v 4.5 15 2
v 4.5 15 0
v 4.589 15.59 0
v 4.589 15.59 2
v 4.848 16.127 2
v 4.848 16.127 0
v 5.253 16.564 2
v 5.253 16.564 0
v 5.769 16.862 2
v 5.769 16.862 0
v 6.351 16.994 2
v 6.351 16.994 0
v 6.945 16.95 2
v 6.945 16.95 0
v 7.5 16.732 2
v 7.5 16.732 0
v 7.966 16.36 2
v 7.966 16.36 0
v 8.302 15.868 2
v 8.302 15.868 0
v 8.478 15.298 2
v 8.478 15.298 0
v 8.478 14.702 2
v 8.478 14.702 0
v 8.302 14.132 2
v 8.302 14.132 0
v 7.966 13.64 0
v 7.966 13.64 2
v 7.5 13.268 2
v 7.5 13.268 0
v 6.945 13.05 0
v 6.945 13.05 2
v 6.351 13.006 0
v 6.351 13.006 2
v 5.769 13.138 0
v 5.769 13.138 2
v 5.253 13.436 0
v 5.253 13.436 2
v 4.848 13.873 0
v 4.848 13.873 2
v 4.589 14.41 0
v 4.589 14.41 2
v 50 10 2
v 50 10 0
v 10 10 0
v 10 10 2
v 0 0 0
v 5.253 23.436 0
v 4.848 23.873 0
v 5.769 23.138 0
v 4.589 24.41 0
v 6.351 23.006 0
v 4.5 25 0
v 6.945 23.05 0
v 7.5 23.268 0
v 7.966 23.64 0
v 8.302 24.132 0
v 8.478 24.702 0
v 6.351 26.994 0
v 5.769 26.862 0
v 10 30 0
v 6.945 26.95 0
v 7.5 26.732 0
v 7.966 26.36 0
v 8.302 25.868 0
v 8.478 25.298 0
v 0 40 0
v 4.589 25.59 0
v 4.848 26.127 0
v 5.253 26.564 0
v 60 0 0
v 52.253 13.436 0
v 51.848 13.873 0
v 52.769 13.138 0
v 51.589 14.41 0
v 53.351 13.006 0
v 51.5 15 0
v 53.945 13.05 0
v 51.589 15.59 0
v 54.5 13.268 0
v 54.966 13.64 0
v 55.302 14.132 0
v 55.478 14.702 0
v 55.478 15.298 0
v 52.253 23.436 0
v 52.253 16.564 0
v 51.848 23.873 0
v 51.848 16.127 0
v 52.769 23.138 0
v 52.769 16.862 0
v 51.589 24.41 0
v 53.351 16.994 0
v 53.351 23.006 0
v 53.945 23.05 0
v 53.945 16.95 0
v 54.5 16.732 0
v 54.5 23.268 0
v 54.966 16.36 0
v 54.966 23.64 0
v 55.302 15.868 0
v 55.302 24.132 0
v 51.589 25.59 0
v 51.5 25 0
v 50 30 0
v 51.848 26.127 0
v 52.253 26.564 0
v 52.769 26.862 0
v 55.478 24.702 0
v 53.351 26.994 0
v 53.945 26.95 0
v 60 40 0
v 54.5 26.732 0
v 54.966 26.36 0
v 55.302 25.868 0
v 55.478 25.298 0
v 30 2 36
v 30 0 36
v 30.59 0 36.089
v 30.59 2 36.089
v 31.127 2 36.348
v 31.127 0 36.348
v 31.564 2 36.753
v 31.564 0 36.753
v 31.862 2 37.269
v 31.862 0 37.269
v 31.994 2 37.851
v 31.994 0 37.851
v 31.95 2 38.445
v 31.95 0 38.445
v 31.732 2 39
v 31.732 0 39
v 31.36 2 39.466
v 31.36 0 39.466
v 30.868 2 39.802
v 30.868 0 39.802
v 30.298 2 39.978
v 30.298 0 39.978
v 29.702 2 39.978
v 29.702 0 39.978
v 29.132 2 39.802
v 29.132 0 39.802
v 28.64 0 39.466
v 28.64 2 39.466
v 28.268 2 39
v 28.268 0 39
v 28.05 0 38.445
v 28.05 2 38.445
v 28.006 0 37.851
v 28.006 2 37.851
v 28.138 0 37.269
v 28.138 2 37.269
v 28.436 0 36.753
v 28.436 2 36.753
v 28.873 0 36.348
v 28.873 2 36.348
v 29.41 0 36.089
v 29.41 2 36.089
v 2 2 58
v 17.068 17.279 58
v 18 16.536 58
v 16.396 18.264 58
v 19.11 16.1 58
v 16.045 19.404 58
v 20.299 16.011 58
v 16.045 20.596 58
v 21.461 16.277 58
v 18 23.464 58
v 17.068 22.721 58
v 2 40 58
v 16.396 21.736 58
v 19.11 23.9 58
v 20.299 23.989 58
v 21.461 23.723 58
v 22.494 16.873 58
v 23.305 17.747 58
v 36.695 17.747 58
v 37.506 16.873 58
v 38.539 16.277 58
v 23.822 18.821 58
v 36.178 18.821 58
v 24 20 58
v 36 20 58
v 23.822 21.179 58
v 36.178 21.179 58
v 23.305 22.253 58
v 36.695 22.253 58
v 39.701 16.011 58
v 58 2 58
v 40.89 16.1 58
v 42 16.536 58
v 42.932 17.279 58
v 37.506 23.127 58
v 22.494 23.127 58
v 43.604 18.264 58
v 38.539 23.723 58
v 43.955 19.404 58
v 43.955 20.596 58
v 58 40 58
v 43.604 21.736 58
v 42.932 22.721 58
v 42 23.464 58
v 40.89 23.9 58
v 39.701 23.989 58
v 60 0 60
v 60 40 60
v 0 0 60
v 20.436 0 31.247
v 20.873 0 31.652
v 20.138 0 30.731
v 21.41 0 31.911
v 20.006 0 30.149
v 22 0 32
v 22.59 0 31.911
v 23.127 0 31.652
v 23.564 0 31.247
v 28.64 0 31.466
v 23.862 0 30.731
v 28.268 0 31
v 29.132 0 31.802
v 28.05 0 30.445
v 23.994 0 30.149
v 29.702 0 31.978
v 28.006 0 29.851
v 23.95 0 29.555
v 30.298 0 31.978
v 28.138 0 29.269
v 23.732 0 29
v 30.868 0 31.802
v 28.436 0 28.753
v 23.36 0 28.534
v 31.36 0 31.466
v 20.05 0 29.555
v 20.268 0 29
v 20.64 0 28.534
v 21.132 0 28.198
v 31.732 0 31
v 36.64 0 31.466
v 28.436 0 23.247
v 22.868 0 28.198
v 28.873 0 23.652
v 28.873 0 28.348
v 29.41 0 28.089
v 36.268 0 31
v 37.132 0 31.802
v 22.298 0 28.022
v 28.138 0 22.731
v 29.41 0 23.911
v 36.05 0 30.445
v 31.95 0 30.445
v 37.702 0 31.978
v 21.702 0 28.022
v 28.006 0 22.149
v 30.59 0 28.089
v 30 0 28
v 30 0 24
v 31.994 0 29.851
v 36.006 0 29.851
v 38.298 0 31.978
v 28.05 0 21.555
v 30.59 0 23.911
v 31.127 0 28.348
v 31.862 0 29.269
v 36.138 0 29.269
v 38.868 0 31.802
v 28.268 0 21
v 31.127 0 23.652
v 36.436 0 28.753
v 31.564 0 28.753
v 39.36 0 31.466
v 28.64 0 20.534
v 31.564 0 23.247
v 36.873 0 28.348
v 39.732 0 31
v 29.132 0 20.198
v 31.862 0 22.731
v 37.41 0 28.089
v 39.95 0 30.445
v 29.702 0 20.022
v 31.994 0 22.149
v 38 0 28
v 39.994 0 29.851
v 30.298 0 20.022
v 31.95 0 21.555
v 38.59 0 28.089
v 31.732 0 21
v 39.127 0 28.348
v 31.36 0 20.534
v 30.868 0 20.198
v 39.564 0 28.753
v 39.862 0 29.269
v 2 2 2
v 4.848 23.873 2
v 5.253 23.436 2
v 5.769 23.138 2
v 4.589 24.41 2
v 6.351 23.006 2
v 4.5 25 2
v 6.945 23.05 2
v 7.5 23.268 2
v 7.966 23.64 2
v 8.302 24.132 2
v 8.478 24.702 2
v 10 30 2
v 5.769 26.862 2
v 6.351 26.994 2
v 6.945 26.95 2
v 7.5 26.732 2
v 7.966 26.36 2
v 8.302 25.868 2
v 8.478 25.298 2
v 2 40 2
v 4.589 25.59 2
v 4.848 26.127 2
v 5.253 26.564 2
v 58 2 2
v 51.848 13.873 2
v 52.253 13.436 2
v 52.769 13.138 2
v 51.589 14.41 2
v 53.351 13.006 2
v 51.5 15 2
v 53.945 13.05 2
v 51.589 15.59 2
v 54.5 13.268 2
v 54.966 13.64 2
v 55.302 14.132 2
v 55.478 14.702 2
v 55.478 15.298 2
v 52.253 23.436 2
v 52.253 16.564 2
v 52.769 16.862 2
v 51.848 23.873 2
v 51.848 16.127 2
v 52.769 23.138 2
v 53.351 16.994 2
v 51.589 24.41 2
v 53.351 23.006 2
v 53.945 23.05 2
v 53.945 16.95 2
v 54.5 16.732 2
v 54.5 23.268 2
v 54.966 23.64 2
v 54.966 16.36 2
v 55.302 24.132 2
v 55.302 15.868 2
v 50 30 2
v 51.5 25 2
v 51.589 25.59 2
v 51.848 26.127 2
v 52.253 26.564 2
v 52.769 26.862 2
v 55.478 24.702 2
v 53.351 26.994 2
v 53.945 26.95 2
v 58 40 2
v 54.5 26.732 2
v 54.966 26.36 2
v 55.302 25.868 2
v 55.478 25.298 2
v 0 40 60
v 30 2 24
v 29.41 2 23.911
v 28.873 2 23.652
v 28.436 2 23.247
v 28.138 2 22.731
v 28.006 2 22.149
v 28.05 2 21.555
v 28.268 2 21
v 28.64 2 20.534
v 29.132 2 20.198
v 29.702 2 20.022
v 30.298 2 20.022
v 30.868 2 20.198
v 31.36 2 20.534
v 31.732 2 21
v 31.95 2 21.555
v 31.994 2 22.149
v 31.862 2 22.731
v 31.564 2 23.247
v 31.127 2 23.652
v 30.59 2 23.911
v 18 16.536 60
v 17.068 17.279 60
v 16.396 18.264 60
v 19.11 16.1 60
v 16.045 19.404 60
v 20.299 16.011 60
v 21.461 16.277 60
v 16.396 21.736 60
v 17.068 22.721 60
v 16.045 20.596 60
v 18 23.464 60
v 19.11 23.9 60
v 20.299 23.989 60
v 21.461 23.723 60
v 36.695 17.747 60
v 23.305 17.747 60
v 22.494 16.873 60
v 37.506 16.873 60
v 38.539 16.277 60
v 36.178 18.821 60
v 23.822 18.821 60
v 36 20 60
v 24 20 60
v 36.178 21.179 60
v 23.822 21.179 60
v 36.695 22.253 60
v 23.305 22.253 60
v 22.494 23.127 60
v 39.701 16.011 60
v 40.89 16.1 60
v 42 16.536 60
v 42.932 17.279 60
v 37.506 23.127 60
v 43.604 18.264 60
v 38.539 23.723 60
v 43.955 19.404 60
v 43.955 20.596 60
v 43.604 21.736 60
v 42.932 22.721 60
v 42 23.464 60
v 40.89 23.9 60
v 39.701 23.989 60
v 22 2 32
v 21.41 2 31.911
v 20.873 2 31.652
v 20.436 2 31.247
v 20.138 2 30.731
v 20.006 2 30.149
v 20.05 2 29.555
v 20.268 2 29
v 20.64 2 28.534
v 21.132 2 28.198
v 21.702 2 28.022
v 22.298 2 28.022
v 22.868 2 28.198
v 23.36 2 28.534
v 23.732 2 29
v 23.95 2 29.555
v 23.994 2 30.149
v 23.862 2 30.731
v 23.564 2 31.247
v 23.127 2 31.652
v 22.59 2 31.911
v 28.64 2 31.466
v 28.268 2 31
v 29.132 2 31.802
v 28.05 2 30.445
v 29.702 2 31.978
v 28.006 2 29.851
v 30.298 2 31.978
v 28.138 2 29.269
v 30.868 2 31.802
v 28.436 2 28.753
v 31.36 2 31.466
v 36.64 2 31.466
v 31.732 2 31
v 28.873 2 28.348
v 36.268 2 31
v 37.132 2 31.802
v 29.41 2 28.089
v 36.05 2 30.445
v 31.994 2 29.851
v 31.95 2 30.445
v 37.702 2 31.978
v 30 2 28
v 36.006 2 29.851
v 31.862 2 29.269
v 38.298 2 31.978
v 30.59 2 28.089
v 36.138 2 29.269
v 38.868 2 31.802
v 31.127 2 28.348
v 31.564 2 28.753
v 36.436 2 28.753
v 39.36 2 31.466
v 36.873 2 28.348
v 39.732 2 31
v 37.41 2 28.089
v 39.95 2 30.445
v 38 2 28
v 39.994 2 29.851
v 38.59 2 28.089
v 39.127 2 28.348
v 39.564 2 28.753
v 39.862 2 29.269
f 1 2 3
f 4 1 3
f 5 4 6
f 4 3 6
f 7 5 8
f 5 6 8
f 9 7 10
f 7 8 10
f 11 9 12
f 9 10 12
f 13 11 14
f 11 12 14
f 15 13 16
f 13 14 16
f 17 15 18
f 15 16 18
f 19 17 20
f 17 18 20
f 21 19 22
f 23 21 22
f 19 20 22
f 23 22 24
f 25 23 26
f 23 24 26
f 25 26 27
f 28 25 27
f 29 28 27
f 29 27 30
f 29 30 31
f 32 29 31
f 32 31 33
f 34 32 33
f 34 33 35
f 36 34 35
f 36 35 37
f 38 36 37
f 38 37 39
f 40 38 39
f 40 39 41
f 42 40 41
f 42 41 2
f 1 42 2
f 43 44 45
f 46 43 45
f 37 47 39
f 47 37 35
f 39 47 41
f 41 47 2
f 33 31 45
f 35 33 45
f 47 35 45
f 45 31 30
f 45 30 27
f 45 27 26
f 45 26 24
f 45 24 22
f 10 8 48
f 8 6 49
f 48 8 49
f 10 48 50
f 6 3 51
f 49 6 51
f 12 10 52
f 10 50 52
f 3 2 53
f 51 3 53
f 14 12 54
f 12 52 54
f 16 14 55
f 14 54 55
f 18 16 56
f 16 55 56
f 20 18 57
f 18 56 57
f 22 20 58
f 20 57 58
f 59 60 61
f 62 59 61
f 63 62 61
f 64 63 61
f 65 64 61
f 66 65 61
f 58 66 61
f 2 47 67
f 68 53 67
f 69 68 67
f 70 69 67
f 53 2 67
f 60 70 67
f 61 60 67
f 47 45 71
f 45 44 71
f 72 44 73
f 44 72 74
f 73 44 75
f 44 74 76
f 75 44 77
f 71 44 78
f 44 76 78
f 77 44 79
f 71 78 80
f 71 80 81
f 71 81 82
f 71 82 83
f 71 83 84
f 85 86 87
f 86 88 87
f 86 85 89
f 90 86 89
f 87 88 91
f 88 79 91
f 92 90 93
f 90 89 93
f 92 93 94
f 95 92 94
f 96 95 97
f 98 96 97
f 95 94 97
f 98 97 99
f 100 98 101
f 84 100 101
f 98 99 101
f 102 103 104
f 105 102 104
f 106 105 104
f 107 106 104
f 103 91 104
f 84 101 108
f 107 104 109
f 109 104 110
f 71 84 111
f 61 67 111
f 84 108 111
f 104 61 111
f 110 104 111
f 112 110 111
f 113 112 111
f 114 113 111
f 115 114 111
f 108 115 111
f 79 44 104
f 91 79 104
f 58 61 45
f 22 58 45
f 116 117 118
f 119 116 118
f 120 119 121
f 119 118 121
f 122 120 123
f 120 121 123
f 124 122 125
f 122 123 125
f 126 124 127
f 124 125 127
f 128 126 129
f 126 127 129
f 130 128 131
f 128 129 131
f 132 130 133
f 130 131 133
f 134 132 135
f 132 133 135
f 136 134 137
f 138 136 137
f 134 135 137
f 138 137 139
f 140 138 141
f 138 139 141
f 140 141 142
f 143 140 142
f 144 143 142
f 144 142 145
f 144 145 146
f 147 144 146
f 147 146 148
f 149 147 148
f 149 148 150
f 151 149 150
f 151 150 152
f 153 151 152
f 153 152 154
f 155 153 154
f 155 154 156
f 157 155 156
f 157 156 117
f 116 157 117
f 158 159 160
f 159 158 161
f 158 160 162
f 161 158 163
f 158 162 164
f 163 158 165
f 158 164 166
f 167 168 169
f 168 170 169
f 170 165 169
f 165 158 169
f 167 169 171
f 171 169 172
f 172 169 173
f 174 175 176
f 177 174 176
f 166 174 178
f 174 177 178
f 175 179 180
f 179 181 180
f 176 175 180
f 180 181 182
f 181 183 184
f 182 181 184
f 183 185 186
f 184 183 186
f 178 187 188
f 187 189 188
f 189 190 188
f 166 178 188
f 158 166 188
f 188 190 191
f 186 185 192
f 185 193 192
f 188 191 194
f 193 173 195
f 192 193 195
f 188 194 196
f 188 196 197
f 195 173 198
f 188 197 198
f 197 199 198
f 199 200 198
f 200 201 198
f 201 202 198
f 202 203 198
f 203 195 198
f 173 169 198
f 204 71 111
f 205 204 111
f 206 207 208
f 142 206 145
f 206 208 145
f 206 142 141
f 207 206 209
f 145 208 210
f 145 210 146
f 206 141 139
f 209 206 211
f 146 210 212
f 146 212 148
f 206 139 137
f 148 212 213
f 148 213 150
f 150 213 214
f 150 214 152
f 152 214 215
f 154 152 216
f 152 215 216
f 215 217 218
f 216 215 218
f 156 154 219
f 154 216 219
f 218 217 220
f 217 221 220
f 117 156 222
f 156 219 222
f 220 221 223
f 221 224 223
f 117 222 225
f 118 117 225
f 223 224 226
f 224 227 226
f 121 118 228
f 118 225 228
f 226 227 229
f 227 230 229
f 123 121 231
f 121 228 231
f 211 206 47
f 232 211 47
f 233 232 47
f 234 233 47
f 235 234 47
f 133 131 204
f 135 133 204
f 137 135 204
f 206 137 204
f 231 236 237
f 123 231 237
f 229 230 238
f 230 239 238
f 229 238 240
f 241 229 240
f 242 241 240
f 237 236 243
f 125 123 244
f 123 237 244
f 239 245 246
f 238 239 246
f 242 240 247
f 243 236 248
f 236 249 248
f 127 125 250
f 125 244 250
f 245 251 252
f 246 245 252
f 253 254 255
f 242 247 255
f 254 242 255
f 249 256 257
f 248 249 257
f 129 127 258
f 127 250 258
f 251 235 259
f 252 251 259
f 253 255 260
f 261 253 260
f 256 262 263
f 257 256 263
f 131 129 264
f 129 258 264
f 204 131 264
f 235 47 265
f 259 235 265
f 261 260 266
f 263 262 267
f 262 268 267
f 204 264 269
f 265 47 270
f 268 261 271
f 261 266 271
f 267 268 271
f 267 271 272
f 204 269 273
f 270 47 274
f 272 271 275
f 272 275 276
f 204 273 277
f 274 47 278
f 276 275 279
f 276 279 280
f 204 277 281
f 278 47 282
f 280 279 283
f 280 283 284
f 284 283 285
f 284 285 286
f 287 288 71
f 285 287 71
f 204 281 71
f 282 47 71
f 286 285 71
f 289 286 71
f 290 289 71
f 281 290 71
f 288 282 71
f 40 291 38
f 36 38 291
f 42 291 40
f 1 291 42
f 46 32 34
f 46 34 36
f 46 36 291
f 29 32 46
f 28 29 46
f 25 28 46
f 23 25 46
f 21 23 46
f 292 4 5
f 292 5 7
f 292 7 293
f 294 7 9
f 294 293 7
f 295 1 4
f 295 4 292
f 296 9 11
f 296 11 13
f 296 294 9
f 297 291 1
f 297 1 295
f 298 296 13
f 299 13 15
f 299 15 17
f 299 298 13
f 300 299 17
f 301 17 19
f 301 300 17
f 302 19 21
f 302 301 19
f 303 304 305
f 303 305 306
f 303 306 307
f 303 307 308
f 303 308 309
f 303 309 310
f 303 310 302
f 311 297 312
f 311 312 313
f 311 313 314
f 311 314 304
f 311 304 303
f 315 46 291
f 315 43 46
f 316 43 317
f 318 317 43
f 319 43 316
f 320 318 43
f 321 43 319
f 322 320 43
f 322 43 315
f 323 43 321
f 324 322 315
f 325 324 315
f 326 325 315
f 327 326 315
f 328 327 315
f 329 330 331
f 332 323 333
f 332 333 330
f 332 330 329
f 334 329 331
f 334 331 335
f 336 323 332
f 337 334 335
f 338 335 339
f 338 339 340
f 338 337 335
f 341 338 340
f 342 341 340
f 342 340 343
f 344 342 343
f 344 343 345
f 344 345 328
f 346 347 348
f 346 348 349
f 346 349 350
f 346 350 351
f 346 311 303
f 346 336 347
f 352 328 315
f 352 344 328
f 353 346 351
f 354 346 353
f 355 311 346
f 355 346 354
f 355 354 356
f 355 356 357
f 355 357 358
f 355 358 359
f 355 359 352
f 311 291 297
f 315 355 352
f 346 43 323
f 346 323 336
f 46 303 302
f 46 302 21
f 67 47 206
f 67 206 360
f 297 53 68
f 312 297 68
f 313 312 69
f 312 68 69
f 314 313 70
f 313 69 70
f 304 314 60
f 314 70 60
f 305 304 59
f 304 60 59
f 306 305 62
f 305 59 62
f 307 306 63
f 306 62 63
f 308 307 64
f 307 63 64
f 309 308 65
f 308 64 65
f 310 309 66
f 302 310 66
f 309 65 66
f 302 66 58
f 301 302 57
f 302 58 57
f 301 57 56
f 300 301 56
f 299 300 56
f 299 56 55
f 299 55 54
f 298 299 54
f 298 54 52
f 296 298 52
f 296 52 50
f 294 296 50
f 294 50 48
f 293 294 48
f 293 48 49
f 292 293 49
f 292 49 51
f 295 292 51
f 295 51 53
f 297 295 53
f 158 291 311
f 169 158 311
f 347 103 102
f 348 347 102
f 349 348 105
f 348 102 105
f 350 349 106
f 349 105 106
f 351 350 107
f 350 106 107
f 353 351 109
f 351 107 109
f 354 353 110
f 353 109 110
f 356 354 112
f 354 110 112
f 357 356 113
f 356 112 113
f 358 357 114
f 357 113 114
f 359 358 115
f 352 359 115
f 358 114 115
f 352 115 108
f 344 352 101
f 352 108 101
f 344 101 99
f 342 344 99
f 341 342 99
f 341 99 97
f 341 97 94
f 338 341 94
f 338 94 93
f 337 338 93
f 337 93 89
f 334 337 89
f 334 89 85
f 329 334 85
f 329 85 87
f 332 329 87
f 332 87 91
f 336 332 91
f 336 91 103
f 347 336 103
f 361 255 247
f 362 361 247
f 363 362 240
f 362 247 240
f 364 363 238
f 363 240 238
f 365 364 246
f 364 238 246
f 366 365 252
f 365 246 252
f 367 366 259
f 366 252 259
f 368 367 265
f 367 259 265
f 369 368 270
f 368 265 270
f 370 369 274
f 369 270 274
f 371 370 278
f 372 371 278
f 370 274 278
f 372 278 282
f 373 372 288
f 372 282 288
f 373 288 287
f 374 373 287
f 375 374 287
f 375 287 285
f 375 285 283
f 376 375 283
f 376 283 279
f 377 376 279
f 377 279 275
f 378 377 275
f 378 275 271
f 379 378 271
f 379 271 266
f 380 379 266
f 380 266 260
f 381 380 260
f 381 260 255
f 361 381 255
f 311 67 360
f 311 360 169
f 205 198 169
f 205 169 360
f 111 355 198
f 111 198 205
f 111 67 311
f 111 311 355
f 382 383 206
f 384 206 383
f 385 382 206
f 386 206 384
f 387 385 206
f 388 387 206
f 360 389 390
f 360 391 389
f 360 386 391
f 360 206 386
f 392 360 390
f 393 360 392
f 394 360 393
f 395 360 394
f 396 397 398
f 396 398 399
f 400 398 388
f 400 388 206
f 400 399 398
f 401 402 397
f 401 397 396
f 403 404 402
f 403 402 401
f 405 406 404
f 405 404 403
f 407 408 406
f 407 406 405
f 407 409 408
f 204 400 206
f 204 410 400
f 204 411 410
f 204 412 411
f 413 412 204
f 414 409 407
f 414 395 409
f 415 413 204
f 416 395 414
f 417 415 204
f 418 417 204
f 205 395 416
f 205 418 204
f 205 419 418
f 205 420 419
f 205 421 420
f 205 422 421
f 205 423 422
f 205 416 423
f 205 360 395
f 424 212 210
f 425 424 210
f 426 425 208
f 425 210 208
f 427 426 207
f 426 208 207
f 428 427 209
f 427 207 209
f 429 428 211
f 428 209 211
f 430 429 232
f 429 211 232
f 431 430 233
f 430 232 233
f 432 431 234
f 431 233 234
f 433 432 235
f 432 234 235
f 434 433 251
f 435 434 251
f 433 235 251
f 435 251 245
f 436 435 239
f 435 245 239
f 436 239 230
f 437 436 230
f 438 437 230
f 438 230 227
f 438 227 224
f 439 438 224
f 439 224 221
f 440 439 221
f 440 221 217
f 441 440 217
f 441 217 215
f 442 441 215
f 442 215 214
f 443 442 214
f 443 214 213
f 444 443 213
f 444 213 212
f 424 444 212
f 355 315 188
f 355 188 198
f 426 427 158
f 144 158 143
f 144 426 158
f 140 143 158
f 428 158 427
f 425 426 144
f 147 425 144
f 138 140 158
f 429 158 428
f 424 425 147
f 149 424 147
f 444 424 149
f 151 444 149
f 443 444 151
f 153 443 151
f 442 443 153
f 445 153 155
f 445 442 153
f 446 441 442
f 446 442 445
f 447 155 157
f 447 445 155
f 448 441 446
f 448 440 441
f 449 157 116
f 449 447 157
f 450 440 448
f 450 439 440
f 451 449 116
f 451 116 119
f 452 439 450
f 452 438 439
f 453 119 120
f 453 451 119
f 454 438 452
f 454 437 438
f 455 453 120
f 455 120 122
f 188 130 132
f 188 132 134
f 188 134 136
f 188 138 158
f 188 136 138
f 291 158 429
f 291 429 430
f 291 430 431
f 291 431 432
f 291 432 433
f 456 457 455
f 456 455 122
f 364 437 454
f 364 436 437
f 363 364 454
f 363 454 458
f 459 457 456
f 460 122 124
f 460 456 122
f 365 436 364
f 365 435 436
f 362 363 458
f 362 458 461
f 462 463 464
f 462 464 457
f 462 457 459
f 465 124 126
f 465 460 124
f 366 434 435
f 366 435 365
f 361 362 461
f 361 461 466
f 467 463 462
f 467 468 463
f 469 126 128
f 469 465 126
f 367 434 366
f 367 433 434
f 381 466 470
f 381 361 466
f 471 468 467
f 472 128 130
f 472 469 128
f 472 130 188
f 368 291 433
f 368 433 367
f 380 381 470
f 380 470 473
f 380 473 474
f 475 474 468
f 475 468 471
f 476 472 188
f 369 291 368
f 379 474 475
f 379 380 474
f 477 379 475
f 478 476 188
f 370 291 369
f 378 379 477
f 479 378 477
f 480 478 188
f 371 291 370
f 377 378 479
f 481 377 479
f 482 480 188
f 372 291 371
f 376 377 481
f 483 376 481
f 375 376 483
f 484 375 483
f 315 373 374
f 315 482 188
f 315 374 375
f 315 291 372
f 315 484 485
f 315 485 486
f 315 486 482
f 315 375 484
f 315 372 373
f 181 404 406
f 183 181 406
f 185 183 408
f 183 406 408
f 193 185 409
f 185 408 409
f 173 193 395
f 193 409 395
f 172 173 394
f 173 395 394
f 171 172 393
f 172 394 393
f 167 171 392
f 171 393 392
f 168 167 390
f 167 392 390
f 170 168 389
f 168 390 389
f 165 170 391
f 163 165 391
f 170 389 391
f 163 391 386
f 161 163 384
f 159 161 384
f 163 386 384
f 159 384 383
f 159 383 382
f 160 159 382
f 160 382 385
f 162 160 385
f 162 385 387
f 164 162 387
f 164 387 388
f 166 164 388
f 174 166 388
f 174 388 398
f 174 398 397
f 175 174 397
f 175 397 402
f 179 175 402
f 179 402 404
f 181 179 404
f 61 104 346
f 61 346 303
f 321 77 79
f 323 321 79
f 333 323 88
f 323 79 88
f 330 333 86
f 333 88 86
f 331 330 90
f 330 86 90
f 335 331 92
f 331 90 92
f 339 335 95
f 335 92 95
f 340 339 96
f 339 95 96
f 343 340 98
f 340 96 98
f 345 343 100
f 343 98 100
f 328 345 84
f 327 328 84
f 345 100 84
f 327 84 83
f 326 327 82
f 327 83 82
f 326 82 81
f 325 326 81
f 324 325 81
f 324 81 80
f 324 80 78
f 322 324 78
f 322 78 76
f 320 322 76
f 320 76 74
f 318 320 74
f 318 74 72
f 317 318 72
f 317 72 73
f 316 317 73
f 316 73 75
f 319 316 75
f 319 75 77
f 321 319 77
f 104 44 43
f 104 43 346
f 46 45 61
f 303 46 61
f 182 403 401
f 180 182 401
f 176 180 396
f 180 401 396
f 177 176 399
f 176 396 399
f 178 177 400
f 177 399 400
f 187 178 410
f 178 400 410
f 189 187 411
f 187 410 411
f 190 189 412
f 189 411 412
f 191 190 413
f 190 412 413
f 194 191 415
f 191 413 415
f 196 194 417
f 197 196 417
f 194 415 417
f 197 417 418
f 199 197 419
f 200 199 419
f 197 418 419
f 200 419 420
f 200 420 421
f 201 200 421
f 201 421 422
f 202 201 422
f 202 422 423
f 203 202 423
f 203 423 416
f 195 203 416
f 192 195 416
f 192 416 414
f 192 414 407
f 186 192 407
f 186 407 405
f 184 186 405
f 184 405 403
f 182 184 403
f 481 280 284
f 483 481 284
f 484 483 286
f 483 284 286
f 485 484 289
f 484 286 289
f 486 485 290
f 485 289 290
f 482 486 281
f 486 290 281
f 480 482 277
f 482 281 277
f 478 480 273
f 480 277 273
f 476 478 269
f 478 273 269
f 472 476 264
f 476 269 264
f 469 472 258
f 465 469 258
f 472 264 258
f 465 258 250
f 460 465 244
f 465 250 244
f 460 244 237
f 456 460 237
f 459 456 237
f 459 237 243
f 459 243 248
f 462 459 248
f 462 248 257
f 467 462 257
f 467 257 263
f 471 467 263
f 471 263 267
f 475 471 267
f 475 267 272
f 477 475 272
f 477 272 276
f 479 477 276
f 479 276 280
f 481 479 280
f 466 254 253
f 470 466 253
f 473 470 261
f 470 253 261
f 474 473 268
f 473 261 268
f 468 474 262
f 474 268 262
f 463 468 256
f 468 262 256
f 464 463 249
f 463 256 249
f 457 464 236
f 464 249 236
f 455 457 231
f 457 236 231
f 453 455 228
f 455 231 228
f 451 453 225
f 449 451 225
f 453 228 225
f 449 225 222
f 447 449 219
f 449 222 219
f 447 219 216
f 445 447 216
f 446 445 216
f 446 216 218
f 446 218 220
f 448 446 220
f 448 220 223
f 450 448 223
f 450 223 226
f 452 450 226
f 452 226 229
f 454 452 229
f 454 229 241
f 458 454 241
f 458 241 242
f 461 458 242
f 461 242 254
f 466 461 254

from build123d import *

# Parameters (mm, degrees)
IZIM2_W                     = 60
IZIM2_H                     = 40
Y_KSEKLIK_EKSTR_ZYON1_DEPTH = 60
BO_ALTMA1_T                 = -2
KES_EKSTR_ZYON2_REACH       = 95.808
IZIM4_R                     = 2
IZIM4_W                     = 40
IZIM4_H                     = 20
KES_EKSTR_ZYON3_REACH       = 95.808
IZIM5_R                     = 2
KES_EKSTR_ZYON4_REACH       = 95.808
IZIM6_R                     = 4


with BuildPart() as part:
    # Çizim2 → Yükseklik-Ekstrüzyon1 (new body)
    with BuildSketch(Plane.XY):
        with Locations((30, 20)):
            Rectangle(IZIM2_W, IZIM2_H)
    extrude(amount=Y_KSEKLIK_EKSTR_ZYON1_DEPTH)

    # İç Boşaltma1
    bo_altma1_openings = [part.faces().sort_by_distance(p)[0] for p in [
        (30, 40, 30),
    ]]
    offset(amount=BO_ALTMA1_T, openings=bo_altma1_openings, kind=Kind.INTERSECTION)

    # Çizim4 → Kes-Ekstrüzyon2 (cut, up to next)
    with BuildSketch(Plane(origin=(0, 0, 0), x_dir=(-1, 0, 0), z_dir=(0, 0, -1)), mode=Mode.PRIVATE) as kes_ekstr_zyon2_sk1:
        with Locations((-53.5, 25)):
            Circle(IZIM4_R)
    kes_ekstr_zyon2_tool1 = extrude(kes_ekstr_zyon2_sk1.sketch, amount=-KES_EKSTR_ZYON2_REACH, mode=Mode.PRIVATE) & part.part
    # Çizim4 → Kes-Ekstrüzyon2 (cut, up to next)
    with BuildSketch(Plane(origin=(0, 0, 0), x_dir=(-1, 0, 0), z_dir=(0, 0, -1)), mode=Mode.PRIVATE) as kes_ekstr_zyon2_sk2:
        with Locations((-53.5, 15)):
            Circle(IZIM4_R)
    kes_ekstr_zyon2_tool2 = extrude(kes_ekstr_zyon2_sk2.sketch, amount=-KES_EKSTR_ZYON2_REACH, mode=Mode.PRIVATE) & part.part
    # Çizim4 → Kes-Ekstrüzyon2 (cut, up to next)
    with BuildSketch(Plane(origin=(0, 0, 0), x_dir=(-1, 0, 0), z_dir=(0, 0, -1)), mode=Mode.PRIVATE) as kes_ekstr_zyon2_sk3:
        with Locations((-6.5, 15)):
            Circle(IZIM4_R)
    kes_ekstr_zyon2_tool3 = extrude(kes_ekstr_zyon2_sk3.sketch, amount=-KES_EKSTR_ZYON2_REACH, mode=Mode.PRIVATE) & part.part
    # Çizim4 → Kes-Ekstrüzyon2 (cut, up to next)
    with BuildSketch(Plane(origin=(0, 0, 0), x_dir=(-1, 0, 0), z_dir=(0, 0, -1)), mode=Mode.PRIVATE) as kes_ekstr_zyon2_sk4:
        with Locations((-6.5, 25)):
            Circle(IZIM4_R)
    kes_ekstr_zyon2_tool4 = extrude(kes_ekstr_zyon2_sk4.sketch, amount=-KES_EKSTR_ZYON2_REACH, mode=Mode.PRIVATE) & part.part
    # Çizim4 → Kes-Ekstrüzyon2 (cut, up to next)
    with BuildSketch(Plane(origin=(0, 0, 0), x_dir=(-1, 0, 0), z_dir=(0, 0, -1)), mode=Mode.PRIVATE) as kes_ekstr_zyon2_sk5:
        with Locations((-30, 20)):
            Rectangle(IZIM4_W, IZIM4_H)
    kes_ekstr_zyon2_tool5 = extrude(kes_ekstr_zyon2_sk5.sketch, amount=-KES_EKSTR_ZYON2_REACH, mode=Mode.PRIVATE) & part.part
    add(kes_ekstr_zyon2_tool1.solids().sort_by_distance((53.5, 25, 0))[0], mode=Mode.SUBTRACT)
    add(kes_ekstr_zyon2_tool2.solids().sort_by_distance((53.5, 15, 0))[0], mode=Mode.SUBTRACT)
    add(kes_ekstr_zyon2_tool3.solids().sort_by_distance((6.5, 15, 0))[0], mode=Mode.SUBTRACT)
    add(kes_ekstr_zyon2_tool4.solids().sort_by_distance((6.5, 25, 0))[0], mode=Mode.SUBTRACT)
    add(kes_ekstr_zyon2_tool5.solids().sort_by_distance((30, 20, 0))[0], mode=Mode.SUBTRACT)

    # Çizim5 → Kes-Ekstrüzyon3 (cut, up to next)
    with BuildSketch(Plane.XZ, mode=Mode.PRIVATE) as kes_ekstr_zyon3_sk1:
        with Locations(Location((30, 30, 0), (0, 0, 270))):
            Circle(IZIM5_R)
    kes_ekstr_zyon3_tool1 = extrude(kes_ekstr_zyon3_sk1.sketch, amount=-KES_EKSTR_ZYON3_REACH, mode=Mode.PRIVATE) & part.part
    # Çizim5 → Kes-Ekstrüzyon3 (cut, up to next)
    with BuildSketch(Plane.XZ, mode=Mode.PRIVATE) as kes_ekstr_zyon3_sk2:
        with Locations(Location((38, 30, 0), (0, 0, 270))):
            Circle(IZIM5_R)
    kes_ekstr_zyon3_tool2 = extrude(kes_ekstr_zyon3_sk2.sketch, amount=-KES_EKSTR_ZYON3_REACH, mode=Mode.PRIVATE) & part.part
    # Çizim5 → Kes-Ekstrüzyon3 (cut, up to next)
    with BuildSketch(Plane.XZ, mode=Mode.PRIVATE) as kes_ekstr_zyon3_sk3:
        with Locations(Location((30, 38, 0), (0, 0, 270))):
            Circle(IZIM5_R)
    kes_ekstr_zyon3_tool3 = extrude(kes_ekstr_zyon3_sk3.sketch, amount=-KES_EKSTR_ZYON3_REACH, mode=Mode.PRIVATE) & part.part
    # Çizim5 → Kes-Ekstrüzyon3 (cut, up to next)
    with BuildSketch(Plane.XZ, mode=Mode.PRIVATE) as kes_ekstr_zyon3_sk4:
        with Locations(Location((30, 22, 0), (0, 0, 90))):
            Circle(IZIM5_R)
    kes_ekstr_zyon3_tool4 = extrude(kes_ekstr_zyon3_sk4.sketch, amount=-KES_EKSTR_ZYON3_REACH, mode=Mode.PRIVATE) & part.part
    # Çizim5 → Kes-Ekstrüzyon3 (cut, up to next)
    with BuildSketch(Plane.XZ, mode=Mode.PRIVATE) as kes_ekstr_zyon3_sk5:
        with Locations(Location((22, 30, 0), (0, 0, 90))):
            Circle(IZIM5_R)
    kes_ekstr_zyon3_tool5 = extrude(kes_ekstr_zyon3_sk5.sketch, amount=-KES_EKSTR_ZYON3_REACH, mode=Mode.PRIVATE) & part.part
    add(kes_ekstr_zyon3_tool1.solids().sort_by_distance((30, 0, 30))[0], mode=Mode.SUBTRACT)
    add(kes_ekstr_zyon3_tool2.solids().sort_by_distance((38, 0, 30))[0], mode=Mode.SUBTRACT)
    add(kes_ekstr_zyon3_tool3.solids().sort_by_distance((30, 0, 38))[0], mode=Mode.SUBTRACT)
    add(kes_ekstr_zyon3_tool4.solids().sort_by_distance((30, 0, 22))[0], mode=Mode.SUBTRACT)
    add(kes_ekstr_zyon3_tool5.solids().sort_by_distance((22, 0, 30))[0], mode=Mode.SUBTRACT)

    # Çizim6 → Kes-Ekstrüzyon4 (cut, up to next)
    with BuildSketch(Plane.XY.offset(60), mode=Mode.PRIVATE) as kes_ekstr_zyon4_sk1:
        with Locations((20, 20)):
            Circle(IZIM6_R)
    kes_ekstr_zyon4_tool1 = extrude(kes_ekstr_zyon4_sk1.sketch, amount=-KES_EKSTR_ZYON4_REACH, mode=Mode.PRIVATE) & part.part
    # Çizim6 → Kes-Ekstrüzyon4 (cut, up to next)
    with BuildSketch(Plane.XY.offset(60), mode=Mode.PRIVATE) as kes_ekstr_zyon4_sk2:
        with Locations(Location((40, 20, 0), (0, 0, 180))):
            Circle(IZIM6_R)
    kes_ekstr_zyon4_tool2 = extrude(kes_ekstr_zyon4_sk2.sketch, amount=-KES_EKSTR_ZYON4_REACH, mode=Mode.PRIVATE) & part.part
    add(kes_ekstr_zyon4_tool1.solids().sort_by_distance((20, 20, 60))[0], mode=Mode.SUBTRACT)
    add(kes_ekstr_zyon4_tool2.solids().sort_by_distance((40, 20, 60))[0], mode=Mode.SUBTRACT)


solid = part.part
